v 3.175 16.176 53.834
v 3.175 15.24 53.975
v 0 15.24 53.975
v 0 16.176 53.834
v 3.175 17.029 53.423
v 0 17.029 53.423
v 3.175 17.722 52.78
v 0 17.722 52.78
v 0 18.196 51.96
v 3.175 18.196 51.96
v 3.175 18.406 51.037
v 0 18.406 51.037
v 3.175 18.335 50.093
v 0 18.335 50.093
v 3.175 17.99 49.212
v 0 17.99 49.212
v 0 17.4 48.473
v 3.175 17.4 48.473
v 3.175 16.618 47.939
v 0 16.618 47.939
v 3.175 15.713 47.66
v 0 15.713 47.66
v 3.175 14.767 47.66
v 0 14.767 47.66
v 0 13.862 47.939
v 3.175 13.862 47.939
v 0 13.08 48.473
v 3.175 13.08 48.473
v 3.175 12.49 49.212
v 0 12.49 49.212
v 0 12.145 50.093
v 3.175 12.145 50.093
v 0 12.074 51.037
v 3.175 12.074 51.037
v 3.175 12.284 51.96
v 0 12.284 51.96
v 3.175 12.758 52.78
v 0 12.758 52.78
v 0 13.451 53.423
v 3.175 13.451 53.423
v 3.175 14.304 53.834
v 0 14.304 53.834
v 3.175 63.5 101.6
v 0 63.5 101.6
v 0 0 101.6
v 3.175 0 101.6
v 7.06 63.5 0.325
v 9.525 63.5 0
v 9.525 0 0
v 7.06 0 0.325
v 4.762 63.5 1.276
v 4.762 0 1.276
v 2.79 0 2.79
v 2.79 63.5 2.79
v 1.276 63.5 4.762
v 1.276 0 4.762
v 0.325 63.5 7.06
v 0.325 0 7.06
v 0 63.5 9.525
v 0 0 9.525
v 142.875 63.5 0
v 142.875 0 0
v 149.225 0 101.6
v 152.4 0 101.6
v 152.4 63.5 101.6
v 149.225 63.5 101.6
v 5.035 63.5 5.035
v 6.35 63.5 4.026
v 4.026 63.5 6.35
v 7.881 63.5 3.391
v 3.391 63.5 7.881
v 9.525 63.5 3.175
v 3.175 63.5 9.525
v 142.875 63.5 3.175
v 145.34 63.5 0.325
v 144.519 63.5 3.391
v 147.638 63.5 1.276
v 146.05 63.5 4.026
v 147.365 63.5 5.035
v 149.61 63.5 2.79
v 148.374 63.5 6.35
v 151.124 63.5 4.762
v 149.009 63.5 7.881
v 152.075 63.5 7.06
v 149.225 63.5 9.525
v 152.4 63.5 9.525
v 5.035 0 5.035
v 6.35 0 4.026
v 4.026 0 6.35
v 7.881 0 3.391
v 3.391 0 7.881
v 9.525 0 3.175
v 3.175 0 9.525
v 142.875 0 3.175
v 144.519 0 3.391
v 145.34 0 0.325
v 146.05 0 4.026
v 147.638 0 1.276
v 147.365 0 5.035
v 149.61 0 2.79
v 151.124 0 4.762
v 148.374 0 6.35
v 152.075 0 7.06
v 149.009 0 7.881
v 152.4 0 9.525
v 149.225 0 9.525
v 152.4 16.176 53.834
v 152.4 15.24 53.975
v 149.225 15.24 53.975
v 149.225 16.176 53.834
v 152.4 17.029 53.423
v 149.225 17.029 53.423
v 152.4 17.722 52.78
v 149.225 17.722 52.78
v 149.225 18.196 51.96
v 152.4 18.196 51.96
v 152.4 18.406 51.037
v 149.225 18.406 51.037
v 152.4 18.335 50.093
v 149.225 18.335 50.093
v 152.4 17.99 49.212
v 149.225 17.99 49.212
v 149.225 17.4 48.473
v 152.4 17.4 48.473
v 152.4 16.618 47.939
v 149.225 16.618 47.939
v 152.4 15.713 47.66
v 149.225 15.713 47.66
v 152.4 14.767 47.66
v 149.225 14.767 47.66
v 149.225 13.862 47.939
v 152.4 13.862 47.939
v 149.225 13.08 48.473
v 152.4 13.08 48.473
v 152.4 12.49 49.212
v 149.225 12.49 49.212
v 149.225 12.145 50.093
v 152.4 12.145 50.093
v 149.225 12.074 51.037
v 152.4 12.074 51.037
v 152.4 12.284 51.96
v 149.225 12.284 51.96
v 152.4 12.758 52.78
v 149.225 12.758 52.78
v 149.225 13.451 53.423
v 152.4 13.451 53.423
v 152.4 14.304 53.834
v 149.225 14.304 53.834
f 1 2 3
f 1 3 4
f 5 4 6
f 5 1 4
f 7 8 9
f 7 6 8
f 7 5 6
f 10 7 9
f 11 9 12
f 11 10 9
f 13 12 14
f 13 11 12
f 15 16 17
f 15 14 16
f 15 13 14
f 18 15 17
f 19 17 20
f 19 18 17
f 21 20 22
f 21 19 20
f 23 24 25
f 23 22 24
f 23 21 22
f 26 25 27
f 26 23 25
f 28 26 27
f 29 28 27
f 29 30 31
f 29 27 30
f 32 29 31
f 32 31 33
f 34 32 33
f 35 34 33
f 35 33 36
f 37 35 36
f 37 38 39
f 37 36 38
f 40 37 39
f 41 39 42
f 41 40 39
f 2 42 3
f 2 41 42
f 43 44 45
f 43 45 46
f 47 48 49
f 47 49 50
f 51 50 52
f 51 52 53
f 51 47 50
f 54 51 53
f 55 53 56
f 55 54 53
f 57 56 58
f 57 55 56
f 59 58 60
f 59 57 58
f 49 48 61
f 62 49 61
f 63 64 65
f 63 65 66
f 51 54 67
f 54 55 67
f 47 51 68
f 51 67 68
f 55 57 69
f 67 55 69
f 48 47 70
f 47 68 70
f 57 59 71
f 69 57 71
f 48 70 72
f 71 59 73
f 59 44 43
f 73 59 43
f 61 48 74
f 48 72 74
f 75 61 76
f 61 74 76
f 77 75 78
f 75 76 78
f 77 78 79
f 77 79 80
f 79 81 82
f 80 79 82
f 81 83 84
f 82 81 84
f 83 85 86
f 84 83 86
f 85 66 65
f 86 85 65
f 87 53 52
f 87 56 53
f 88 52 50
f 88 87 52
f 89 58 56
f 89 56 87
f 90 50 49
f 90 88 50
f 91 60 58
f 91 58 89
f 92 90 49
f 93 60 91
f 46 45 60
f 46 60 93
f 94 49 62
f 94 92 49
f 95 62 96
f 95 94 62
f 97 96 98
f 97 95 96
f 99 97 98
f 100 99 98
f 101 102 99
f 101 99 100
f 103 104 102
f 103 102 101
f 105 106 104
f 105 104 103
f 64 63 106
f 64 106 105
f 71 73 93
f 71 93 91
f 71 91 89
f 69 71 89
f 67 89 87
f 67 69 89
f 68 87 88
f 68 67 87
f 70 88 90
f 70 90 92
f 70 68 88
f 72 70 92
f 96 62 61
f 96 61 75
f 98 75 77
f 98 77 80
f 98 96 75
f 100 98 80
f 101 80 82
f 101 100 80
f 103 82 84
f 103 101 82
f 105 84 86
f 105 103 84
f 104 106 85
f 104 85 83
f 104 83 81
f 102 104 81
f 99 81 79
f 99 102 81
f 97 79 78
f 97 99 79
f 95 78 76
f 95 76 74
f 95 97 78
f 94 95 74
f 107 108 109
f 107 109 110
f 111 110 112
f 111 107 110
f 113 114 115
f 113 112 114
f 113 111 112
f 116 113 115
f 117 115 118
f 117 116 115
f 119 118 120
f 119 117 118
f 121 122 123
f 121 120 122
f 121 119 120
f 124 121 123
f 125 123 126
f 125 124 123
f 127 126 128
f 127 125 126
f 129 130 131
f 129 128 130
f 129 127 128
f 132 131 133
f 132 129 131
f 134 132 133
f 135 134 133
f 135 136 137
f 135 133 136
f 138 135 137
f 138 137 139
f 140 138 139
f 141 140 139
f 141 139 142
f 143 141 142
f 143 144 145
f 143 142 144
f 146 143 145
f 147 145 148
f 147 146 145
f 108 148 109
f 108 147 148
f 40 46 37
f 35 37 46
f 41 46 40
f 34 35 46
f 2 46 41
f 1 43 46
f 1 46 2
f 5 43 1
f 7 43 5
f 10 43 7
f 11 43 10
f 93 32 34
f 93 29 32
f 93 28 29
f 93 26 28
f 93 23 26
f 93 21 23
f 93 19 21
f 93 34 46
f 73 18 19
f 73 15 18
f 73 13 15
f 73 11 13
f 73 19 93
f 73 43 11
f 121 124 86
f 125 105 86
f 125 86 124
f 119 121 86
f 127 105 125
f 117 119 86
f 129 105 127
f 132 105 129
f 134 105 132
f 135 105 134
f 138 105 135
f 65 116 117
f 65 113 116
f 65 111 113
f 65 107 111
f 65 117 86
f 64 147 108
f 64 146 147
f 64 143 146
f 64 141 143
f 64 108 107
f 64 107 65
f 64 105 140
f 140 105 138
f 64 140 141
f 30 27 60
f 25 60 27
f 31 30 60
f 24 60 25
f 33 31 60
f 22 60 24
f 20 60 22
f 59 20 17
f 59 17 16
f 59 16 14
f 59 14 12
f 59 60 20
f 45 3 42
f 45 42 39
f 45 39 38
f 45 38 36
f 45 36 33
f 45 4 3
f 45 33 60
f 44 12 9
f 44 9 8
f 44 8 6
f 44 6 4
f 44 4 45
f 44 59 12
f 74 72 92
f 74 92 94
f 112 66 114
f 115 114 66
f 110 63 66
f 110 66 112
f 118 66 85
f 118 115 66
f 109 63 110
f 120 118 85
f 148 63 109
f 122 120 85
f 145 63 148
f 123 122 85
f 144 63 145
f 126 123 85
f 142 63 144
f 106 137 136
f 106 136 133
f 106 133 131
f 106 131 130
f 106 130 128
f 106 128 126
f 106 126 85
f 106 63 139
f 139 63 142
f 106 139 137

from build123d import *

# Parameters (mm, degrees)
SKETCH1_W                      = 152.4
SKETCH1_H                      = 63.5
BOSS_EXTRUDE1_DEPTH            = 3.175
EDGE_FLANGE1_STRIP_W           = 25.4
EDGE_FLANGE1_STRIP_H           = 3.175
EDGE_FLANGE1_STRIP_CUT_DEPTH   = 63.5
EDGE_FLANGE1_STRIP_2_W         = 25.4
EDGE_FLANGE1_STRIP_2_H         = 3.175
EDGE_FLANGE1_STRIP_CUT_2_DEPTH = 63.5
EDGE_FLANGE1_DEPTH             = 63.5
EDGE_FLANGE1_BEND_DEPTH        = 63.5
CUT_EXTRUDE1_DEPTH             = 194.857086535
CUT_EXTRUDE1_DEPTH_BACK        = 194.857086535
SKETCH22_R                     = 3.175


# Sheet-metal steps are written as plain solids
with BuildPart() as part:
    # Sketch1 → Boss-Extrude1 (new body)
    with BuildSketch(Plane.XY):
        with Locations((76.2, 31.75)):
            Rectangle(SKETCH1_W, SKETCH1_H)
    extrude(amount=BOSS_EXTRUDE1_DEPTH)

    # Edge-Flange1 strip (across the edge) → Edge-Flange1 strip cut (cut)
    with BuildSketch(Plane(origin=(0, 63.5, 3.175), x_dir=(1, 0, 0), z_dir=(0, -1, 0))):
        with Locations((-3.175, -1.5875)):
            Rectangle(EDGE_FLANGE1_STRIP_W, EDGE_FLANGE1_STRIP_H)
    extrude(amount=EDGE_FLANGE1_STRIP_CUT_DEPTH, mode=Mode.SUBTRACT)

    # Edge-Flange1 strip 2 (across the edge) → Edge-Flange1 strip cut 2 (cut)
    with BuildSketch(Plane(origin=(152.4, 0, 3.175), x_dir=(-1, 0, 0), z_dir=(0, 1, 0))):
        with Locations((-3.175, -1.5875)):
            Rectangle(EDGE_FLANGE1_STRIP_2_W, EDGE_FLANGE1_STRIP_2_H)
    extrude(amount=EDGE_FLANGE1_STRIP_CUT_2_DEPTH, mode=Mode.SUBTRACT)

    # Edge-Flange1 section (across the edge) → Edge-Flange1 (add)
    with BuildSketch(Plane(origin=(0, 63.5, 3.175), x_dir=(1, 0, 0), z_dir=(0, -1, 0))):
        with BuildLine():
            Line((0, 6.35), (0, 98.425))
            Line((0, 98.425), (3.175, 98.425))
            Line((3.175, 98.425), (3.175, 6.35))
            ThreePointArc((3.175, 6.35), (5.034871939, 1.859871939), (9.525, 0))
            Line((9.525, 0), (9.525, -3.175))
            ThreePointArc((9.525, -3.175), (2.789807909, -0.385192091), (0, 6.35))
        make_face()
    extrude(amount=EDGE_FLANGE1_DEPTH)

    # Edge-Flange1 section 2 (across the edge) → Edge-Flange1 bend (add)
    with BuildSketch(Plane(origin=(152.4, 0, 3.175), x_dir=(-1, 0, 0), z_dir=(0, 1, 0))):
        with BuildLine():
            Line((0, 6.35), (0, 98.425))
            Line((0, 98.425), (3.175, 98.425))
            Line((3.175, 98.425), (3.175, 6.35))
            ThreePointArc((3.175, 6.35), (5.034871939, 1.859871939), (9.525, 0))
            Line((9.525, 0), (9.525, -3.175))
            ThreePointArc((9.525, -3.175), (2.789807909, -0.385192091), (0, 6.35))
        make_face()
    extrude(amount=EDGE_FLANGE1_BEND_DEPTH)

    # Sketch22 → Cut-Extrude1 (cut, two sides: drawn at the far end of the back side and taken through both)
    with BuildSketch(Plane.ZY.offset(-CUT_EXTRUDE1_DEPTH_BACK)):
        with Locations((50.8, 15.24)):
            Circle(SKETCH22_R)
    extrude(amount=CUT_EXTRUDE1_DEPTH + CUT_EXTRUDE1_DEPTH_BACK, mode=Mode.SUBTRACT)


solid = part.part
